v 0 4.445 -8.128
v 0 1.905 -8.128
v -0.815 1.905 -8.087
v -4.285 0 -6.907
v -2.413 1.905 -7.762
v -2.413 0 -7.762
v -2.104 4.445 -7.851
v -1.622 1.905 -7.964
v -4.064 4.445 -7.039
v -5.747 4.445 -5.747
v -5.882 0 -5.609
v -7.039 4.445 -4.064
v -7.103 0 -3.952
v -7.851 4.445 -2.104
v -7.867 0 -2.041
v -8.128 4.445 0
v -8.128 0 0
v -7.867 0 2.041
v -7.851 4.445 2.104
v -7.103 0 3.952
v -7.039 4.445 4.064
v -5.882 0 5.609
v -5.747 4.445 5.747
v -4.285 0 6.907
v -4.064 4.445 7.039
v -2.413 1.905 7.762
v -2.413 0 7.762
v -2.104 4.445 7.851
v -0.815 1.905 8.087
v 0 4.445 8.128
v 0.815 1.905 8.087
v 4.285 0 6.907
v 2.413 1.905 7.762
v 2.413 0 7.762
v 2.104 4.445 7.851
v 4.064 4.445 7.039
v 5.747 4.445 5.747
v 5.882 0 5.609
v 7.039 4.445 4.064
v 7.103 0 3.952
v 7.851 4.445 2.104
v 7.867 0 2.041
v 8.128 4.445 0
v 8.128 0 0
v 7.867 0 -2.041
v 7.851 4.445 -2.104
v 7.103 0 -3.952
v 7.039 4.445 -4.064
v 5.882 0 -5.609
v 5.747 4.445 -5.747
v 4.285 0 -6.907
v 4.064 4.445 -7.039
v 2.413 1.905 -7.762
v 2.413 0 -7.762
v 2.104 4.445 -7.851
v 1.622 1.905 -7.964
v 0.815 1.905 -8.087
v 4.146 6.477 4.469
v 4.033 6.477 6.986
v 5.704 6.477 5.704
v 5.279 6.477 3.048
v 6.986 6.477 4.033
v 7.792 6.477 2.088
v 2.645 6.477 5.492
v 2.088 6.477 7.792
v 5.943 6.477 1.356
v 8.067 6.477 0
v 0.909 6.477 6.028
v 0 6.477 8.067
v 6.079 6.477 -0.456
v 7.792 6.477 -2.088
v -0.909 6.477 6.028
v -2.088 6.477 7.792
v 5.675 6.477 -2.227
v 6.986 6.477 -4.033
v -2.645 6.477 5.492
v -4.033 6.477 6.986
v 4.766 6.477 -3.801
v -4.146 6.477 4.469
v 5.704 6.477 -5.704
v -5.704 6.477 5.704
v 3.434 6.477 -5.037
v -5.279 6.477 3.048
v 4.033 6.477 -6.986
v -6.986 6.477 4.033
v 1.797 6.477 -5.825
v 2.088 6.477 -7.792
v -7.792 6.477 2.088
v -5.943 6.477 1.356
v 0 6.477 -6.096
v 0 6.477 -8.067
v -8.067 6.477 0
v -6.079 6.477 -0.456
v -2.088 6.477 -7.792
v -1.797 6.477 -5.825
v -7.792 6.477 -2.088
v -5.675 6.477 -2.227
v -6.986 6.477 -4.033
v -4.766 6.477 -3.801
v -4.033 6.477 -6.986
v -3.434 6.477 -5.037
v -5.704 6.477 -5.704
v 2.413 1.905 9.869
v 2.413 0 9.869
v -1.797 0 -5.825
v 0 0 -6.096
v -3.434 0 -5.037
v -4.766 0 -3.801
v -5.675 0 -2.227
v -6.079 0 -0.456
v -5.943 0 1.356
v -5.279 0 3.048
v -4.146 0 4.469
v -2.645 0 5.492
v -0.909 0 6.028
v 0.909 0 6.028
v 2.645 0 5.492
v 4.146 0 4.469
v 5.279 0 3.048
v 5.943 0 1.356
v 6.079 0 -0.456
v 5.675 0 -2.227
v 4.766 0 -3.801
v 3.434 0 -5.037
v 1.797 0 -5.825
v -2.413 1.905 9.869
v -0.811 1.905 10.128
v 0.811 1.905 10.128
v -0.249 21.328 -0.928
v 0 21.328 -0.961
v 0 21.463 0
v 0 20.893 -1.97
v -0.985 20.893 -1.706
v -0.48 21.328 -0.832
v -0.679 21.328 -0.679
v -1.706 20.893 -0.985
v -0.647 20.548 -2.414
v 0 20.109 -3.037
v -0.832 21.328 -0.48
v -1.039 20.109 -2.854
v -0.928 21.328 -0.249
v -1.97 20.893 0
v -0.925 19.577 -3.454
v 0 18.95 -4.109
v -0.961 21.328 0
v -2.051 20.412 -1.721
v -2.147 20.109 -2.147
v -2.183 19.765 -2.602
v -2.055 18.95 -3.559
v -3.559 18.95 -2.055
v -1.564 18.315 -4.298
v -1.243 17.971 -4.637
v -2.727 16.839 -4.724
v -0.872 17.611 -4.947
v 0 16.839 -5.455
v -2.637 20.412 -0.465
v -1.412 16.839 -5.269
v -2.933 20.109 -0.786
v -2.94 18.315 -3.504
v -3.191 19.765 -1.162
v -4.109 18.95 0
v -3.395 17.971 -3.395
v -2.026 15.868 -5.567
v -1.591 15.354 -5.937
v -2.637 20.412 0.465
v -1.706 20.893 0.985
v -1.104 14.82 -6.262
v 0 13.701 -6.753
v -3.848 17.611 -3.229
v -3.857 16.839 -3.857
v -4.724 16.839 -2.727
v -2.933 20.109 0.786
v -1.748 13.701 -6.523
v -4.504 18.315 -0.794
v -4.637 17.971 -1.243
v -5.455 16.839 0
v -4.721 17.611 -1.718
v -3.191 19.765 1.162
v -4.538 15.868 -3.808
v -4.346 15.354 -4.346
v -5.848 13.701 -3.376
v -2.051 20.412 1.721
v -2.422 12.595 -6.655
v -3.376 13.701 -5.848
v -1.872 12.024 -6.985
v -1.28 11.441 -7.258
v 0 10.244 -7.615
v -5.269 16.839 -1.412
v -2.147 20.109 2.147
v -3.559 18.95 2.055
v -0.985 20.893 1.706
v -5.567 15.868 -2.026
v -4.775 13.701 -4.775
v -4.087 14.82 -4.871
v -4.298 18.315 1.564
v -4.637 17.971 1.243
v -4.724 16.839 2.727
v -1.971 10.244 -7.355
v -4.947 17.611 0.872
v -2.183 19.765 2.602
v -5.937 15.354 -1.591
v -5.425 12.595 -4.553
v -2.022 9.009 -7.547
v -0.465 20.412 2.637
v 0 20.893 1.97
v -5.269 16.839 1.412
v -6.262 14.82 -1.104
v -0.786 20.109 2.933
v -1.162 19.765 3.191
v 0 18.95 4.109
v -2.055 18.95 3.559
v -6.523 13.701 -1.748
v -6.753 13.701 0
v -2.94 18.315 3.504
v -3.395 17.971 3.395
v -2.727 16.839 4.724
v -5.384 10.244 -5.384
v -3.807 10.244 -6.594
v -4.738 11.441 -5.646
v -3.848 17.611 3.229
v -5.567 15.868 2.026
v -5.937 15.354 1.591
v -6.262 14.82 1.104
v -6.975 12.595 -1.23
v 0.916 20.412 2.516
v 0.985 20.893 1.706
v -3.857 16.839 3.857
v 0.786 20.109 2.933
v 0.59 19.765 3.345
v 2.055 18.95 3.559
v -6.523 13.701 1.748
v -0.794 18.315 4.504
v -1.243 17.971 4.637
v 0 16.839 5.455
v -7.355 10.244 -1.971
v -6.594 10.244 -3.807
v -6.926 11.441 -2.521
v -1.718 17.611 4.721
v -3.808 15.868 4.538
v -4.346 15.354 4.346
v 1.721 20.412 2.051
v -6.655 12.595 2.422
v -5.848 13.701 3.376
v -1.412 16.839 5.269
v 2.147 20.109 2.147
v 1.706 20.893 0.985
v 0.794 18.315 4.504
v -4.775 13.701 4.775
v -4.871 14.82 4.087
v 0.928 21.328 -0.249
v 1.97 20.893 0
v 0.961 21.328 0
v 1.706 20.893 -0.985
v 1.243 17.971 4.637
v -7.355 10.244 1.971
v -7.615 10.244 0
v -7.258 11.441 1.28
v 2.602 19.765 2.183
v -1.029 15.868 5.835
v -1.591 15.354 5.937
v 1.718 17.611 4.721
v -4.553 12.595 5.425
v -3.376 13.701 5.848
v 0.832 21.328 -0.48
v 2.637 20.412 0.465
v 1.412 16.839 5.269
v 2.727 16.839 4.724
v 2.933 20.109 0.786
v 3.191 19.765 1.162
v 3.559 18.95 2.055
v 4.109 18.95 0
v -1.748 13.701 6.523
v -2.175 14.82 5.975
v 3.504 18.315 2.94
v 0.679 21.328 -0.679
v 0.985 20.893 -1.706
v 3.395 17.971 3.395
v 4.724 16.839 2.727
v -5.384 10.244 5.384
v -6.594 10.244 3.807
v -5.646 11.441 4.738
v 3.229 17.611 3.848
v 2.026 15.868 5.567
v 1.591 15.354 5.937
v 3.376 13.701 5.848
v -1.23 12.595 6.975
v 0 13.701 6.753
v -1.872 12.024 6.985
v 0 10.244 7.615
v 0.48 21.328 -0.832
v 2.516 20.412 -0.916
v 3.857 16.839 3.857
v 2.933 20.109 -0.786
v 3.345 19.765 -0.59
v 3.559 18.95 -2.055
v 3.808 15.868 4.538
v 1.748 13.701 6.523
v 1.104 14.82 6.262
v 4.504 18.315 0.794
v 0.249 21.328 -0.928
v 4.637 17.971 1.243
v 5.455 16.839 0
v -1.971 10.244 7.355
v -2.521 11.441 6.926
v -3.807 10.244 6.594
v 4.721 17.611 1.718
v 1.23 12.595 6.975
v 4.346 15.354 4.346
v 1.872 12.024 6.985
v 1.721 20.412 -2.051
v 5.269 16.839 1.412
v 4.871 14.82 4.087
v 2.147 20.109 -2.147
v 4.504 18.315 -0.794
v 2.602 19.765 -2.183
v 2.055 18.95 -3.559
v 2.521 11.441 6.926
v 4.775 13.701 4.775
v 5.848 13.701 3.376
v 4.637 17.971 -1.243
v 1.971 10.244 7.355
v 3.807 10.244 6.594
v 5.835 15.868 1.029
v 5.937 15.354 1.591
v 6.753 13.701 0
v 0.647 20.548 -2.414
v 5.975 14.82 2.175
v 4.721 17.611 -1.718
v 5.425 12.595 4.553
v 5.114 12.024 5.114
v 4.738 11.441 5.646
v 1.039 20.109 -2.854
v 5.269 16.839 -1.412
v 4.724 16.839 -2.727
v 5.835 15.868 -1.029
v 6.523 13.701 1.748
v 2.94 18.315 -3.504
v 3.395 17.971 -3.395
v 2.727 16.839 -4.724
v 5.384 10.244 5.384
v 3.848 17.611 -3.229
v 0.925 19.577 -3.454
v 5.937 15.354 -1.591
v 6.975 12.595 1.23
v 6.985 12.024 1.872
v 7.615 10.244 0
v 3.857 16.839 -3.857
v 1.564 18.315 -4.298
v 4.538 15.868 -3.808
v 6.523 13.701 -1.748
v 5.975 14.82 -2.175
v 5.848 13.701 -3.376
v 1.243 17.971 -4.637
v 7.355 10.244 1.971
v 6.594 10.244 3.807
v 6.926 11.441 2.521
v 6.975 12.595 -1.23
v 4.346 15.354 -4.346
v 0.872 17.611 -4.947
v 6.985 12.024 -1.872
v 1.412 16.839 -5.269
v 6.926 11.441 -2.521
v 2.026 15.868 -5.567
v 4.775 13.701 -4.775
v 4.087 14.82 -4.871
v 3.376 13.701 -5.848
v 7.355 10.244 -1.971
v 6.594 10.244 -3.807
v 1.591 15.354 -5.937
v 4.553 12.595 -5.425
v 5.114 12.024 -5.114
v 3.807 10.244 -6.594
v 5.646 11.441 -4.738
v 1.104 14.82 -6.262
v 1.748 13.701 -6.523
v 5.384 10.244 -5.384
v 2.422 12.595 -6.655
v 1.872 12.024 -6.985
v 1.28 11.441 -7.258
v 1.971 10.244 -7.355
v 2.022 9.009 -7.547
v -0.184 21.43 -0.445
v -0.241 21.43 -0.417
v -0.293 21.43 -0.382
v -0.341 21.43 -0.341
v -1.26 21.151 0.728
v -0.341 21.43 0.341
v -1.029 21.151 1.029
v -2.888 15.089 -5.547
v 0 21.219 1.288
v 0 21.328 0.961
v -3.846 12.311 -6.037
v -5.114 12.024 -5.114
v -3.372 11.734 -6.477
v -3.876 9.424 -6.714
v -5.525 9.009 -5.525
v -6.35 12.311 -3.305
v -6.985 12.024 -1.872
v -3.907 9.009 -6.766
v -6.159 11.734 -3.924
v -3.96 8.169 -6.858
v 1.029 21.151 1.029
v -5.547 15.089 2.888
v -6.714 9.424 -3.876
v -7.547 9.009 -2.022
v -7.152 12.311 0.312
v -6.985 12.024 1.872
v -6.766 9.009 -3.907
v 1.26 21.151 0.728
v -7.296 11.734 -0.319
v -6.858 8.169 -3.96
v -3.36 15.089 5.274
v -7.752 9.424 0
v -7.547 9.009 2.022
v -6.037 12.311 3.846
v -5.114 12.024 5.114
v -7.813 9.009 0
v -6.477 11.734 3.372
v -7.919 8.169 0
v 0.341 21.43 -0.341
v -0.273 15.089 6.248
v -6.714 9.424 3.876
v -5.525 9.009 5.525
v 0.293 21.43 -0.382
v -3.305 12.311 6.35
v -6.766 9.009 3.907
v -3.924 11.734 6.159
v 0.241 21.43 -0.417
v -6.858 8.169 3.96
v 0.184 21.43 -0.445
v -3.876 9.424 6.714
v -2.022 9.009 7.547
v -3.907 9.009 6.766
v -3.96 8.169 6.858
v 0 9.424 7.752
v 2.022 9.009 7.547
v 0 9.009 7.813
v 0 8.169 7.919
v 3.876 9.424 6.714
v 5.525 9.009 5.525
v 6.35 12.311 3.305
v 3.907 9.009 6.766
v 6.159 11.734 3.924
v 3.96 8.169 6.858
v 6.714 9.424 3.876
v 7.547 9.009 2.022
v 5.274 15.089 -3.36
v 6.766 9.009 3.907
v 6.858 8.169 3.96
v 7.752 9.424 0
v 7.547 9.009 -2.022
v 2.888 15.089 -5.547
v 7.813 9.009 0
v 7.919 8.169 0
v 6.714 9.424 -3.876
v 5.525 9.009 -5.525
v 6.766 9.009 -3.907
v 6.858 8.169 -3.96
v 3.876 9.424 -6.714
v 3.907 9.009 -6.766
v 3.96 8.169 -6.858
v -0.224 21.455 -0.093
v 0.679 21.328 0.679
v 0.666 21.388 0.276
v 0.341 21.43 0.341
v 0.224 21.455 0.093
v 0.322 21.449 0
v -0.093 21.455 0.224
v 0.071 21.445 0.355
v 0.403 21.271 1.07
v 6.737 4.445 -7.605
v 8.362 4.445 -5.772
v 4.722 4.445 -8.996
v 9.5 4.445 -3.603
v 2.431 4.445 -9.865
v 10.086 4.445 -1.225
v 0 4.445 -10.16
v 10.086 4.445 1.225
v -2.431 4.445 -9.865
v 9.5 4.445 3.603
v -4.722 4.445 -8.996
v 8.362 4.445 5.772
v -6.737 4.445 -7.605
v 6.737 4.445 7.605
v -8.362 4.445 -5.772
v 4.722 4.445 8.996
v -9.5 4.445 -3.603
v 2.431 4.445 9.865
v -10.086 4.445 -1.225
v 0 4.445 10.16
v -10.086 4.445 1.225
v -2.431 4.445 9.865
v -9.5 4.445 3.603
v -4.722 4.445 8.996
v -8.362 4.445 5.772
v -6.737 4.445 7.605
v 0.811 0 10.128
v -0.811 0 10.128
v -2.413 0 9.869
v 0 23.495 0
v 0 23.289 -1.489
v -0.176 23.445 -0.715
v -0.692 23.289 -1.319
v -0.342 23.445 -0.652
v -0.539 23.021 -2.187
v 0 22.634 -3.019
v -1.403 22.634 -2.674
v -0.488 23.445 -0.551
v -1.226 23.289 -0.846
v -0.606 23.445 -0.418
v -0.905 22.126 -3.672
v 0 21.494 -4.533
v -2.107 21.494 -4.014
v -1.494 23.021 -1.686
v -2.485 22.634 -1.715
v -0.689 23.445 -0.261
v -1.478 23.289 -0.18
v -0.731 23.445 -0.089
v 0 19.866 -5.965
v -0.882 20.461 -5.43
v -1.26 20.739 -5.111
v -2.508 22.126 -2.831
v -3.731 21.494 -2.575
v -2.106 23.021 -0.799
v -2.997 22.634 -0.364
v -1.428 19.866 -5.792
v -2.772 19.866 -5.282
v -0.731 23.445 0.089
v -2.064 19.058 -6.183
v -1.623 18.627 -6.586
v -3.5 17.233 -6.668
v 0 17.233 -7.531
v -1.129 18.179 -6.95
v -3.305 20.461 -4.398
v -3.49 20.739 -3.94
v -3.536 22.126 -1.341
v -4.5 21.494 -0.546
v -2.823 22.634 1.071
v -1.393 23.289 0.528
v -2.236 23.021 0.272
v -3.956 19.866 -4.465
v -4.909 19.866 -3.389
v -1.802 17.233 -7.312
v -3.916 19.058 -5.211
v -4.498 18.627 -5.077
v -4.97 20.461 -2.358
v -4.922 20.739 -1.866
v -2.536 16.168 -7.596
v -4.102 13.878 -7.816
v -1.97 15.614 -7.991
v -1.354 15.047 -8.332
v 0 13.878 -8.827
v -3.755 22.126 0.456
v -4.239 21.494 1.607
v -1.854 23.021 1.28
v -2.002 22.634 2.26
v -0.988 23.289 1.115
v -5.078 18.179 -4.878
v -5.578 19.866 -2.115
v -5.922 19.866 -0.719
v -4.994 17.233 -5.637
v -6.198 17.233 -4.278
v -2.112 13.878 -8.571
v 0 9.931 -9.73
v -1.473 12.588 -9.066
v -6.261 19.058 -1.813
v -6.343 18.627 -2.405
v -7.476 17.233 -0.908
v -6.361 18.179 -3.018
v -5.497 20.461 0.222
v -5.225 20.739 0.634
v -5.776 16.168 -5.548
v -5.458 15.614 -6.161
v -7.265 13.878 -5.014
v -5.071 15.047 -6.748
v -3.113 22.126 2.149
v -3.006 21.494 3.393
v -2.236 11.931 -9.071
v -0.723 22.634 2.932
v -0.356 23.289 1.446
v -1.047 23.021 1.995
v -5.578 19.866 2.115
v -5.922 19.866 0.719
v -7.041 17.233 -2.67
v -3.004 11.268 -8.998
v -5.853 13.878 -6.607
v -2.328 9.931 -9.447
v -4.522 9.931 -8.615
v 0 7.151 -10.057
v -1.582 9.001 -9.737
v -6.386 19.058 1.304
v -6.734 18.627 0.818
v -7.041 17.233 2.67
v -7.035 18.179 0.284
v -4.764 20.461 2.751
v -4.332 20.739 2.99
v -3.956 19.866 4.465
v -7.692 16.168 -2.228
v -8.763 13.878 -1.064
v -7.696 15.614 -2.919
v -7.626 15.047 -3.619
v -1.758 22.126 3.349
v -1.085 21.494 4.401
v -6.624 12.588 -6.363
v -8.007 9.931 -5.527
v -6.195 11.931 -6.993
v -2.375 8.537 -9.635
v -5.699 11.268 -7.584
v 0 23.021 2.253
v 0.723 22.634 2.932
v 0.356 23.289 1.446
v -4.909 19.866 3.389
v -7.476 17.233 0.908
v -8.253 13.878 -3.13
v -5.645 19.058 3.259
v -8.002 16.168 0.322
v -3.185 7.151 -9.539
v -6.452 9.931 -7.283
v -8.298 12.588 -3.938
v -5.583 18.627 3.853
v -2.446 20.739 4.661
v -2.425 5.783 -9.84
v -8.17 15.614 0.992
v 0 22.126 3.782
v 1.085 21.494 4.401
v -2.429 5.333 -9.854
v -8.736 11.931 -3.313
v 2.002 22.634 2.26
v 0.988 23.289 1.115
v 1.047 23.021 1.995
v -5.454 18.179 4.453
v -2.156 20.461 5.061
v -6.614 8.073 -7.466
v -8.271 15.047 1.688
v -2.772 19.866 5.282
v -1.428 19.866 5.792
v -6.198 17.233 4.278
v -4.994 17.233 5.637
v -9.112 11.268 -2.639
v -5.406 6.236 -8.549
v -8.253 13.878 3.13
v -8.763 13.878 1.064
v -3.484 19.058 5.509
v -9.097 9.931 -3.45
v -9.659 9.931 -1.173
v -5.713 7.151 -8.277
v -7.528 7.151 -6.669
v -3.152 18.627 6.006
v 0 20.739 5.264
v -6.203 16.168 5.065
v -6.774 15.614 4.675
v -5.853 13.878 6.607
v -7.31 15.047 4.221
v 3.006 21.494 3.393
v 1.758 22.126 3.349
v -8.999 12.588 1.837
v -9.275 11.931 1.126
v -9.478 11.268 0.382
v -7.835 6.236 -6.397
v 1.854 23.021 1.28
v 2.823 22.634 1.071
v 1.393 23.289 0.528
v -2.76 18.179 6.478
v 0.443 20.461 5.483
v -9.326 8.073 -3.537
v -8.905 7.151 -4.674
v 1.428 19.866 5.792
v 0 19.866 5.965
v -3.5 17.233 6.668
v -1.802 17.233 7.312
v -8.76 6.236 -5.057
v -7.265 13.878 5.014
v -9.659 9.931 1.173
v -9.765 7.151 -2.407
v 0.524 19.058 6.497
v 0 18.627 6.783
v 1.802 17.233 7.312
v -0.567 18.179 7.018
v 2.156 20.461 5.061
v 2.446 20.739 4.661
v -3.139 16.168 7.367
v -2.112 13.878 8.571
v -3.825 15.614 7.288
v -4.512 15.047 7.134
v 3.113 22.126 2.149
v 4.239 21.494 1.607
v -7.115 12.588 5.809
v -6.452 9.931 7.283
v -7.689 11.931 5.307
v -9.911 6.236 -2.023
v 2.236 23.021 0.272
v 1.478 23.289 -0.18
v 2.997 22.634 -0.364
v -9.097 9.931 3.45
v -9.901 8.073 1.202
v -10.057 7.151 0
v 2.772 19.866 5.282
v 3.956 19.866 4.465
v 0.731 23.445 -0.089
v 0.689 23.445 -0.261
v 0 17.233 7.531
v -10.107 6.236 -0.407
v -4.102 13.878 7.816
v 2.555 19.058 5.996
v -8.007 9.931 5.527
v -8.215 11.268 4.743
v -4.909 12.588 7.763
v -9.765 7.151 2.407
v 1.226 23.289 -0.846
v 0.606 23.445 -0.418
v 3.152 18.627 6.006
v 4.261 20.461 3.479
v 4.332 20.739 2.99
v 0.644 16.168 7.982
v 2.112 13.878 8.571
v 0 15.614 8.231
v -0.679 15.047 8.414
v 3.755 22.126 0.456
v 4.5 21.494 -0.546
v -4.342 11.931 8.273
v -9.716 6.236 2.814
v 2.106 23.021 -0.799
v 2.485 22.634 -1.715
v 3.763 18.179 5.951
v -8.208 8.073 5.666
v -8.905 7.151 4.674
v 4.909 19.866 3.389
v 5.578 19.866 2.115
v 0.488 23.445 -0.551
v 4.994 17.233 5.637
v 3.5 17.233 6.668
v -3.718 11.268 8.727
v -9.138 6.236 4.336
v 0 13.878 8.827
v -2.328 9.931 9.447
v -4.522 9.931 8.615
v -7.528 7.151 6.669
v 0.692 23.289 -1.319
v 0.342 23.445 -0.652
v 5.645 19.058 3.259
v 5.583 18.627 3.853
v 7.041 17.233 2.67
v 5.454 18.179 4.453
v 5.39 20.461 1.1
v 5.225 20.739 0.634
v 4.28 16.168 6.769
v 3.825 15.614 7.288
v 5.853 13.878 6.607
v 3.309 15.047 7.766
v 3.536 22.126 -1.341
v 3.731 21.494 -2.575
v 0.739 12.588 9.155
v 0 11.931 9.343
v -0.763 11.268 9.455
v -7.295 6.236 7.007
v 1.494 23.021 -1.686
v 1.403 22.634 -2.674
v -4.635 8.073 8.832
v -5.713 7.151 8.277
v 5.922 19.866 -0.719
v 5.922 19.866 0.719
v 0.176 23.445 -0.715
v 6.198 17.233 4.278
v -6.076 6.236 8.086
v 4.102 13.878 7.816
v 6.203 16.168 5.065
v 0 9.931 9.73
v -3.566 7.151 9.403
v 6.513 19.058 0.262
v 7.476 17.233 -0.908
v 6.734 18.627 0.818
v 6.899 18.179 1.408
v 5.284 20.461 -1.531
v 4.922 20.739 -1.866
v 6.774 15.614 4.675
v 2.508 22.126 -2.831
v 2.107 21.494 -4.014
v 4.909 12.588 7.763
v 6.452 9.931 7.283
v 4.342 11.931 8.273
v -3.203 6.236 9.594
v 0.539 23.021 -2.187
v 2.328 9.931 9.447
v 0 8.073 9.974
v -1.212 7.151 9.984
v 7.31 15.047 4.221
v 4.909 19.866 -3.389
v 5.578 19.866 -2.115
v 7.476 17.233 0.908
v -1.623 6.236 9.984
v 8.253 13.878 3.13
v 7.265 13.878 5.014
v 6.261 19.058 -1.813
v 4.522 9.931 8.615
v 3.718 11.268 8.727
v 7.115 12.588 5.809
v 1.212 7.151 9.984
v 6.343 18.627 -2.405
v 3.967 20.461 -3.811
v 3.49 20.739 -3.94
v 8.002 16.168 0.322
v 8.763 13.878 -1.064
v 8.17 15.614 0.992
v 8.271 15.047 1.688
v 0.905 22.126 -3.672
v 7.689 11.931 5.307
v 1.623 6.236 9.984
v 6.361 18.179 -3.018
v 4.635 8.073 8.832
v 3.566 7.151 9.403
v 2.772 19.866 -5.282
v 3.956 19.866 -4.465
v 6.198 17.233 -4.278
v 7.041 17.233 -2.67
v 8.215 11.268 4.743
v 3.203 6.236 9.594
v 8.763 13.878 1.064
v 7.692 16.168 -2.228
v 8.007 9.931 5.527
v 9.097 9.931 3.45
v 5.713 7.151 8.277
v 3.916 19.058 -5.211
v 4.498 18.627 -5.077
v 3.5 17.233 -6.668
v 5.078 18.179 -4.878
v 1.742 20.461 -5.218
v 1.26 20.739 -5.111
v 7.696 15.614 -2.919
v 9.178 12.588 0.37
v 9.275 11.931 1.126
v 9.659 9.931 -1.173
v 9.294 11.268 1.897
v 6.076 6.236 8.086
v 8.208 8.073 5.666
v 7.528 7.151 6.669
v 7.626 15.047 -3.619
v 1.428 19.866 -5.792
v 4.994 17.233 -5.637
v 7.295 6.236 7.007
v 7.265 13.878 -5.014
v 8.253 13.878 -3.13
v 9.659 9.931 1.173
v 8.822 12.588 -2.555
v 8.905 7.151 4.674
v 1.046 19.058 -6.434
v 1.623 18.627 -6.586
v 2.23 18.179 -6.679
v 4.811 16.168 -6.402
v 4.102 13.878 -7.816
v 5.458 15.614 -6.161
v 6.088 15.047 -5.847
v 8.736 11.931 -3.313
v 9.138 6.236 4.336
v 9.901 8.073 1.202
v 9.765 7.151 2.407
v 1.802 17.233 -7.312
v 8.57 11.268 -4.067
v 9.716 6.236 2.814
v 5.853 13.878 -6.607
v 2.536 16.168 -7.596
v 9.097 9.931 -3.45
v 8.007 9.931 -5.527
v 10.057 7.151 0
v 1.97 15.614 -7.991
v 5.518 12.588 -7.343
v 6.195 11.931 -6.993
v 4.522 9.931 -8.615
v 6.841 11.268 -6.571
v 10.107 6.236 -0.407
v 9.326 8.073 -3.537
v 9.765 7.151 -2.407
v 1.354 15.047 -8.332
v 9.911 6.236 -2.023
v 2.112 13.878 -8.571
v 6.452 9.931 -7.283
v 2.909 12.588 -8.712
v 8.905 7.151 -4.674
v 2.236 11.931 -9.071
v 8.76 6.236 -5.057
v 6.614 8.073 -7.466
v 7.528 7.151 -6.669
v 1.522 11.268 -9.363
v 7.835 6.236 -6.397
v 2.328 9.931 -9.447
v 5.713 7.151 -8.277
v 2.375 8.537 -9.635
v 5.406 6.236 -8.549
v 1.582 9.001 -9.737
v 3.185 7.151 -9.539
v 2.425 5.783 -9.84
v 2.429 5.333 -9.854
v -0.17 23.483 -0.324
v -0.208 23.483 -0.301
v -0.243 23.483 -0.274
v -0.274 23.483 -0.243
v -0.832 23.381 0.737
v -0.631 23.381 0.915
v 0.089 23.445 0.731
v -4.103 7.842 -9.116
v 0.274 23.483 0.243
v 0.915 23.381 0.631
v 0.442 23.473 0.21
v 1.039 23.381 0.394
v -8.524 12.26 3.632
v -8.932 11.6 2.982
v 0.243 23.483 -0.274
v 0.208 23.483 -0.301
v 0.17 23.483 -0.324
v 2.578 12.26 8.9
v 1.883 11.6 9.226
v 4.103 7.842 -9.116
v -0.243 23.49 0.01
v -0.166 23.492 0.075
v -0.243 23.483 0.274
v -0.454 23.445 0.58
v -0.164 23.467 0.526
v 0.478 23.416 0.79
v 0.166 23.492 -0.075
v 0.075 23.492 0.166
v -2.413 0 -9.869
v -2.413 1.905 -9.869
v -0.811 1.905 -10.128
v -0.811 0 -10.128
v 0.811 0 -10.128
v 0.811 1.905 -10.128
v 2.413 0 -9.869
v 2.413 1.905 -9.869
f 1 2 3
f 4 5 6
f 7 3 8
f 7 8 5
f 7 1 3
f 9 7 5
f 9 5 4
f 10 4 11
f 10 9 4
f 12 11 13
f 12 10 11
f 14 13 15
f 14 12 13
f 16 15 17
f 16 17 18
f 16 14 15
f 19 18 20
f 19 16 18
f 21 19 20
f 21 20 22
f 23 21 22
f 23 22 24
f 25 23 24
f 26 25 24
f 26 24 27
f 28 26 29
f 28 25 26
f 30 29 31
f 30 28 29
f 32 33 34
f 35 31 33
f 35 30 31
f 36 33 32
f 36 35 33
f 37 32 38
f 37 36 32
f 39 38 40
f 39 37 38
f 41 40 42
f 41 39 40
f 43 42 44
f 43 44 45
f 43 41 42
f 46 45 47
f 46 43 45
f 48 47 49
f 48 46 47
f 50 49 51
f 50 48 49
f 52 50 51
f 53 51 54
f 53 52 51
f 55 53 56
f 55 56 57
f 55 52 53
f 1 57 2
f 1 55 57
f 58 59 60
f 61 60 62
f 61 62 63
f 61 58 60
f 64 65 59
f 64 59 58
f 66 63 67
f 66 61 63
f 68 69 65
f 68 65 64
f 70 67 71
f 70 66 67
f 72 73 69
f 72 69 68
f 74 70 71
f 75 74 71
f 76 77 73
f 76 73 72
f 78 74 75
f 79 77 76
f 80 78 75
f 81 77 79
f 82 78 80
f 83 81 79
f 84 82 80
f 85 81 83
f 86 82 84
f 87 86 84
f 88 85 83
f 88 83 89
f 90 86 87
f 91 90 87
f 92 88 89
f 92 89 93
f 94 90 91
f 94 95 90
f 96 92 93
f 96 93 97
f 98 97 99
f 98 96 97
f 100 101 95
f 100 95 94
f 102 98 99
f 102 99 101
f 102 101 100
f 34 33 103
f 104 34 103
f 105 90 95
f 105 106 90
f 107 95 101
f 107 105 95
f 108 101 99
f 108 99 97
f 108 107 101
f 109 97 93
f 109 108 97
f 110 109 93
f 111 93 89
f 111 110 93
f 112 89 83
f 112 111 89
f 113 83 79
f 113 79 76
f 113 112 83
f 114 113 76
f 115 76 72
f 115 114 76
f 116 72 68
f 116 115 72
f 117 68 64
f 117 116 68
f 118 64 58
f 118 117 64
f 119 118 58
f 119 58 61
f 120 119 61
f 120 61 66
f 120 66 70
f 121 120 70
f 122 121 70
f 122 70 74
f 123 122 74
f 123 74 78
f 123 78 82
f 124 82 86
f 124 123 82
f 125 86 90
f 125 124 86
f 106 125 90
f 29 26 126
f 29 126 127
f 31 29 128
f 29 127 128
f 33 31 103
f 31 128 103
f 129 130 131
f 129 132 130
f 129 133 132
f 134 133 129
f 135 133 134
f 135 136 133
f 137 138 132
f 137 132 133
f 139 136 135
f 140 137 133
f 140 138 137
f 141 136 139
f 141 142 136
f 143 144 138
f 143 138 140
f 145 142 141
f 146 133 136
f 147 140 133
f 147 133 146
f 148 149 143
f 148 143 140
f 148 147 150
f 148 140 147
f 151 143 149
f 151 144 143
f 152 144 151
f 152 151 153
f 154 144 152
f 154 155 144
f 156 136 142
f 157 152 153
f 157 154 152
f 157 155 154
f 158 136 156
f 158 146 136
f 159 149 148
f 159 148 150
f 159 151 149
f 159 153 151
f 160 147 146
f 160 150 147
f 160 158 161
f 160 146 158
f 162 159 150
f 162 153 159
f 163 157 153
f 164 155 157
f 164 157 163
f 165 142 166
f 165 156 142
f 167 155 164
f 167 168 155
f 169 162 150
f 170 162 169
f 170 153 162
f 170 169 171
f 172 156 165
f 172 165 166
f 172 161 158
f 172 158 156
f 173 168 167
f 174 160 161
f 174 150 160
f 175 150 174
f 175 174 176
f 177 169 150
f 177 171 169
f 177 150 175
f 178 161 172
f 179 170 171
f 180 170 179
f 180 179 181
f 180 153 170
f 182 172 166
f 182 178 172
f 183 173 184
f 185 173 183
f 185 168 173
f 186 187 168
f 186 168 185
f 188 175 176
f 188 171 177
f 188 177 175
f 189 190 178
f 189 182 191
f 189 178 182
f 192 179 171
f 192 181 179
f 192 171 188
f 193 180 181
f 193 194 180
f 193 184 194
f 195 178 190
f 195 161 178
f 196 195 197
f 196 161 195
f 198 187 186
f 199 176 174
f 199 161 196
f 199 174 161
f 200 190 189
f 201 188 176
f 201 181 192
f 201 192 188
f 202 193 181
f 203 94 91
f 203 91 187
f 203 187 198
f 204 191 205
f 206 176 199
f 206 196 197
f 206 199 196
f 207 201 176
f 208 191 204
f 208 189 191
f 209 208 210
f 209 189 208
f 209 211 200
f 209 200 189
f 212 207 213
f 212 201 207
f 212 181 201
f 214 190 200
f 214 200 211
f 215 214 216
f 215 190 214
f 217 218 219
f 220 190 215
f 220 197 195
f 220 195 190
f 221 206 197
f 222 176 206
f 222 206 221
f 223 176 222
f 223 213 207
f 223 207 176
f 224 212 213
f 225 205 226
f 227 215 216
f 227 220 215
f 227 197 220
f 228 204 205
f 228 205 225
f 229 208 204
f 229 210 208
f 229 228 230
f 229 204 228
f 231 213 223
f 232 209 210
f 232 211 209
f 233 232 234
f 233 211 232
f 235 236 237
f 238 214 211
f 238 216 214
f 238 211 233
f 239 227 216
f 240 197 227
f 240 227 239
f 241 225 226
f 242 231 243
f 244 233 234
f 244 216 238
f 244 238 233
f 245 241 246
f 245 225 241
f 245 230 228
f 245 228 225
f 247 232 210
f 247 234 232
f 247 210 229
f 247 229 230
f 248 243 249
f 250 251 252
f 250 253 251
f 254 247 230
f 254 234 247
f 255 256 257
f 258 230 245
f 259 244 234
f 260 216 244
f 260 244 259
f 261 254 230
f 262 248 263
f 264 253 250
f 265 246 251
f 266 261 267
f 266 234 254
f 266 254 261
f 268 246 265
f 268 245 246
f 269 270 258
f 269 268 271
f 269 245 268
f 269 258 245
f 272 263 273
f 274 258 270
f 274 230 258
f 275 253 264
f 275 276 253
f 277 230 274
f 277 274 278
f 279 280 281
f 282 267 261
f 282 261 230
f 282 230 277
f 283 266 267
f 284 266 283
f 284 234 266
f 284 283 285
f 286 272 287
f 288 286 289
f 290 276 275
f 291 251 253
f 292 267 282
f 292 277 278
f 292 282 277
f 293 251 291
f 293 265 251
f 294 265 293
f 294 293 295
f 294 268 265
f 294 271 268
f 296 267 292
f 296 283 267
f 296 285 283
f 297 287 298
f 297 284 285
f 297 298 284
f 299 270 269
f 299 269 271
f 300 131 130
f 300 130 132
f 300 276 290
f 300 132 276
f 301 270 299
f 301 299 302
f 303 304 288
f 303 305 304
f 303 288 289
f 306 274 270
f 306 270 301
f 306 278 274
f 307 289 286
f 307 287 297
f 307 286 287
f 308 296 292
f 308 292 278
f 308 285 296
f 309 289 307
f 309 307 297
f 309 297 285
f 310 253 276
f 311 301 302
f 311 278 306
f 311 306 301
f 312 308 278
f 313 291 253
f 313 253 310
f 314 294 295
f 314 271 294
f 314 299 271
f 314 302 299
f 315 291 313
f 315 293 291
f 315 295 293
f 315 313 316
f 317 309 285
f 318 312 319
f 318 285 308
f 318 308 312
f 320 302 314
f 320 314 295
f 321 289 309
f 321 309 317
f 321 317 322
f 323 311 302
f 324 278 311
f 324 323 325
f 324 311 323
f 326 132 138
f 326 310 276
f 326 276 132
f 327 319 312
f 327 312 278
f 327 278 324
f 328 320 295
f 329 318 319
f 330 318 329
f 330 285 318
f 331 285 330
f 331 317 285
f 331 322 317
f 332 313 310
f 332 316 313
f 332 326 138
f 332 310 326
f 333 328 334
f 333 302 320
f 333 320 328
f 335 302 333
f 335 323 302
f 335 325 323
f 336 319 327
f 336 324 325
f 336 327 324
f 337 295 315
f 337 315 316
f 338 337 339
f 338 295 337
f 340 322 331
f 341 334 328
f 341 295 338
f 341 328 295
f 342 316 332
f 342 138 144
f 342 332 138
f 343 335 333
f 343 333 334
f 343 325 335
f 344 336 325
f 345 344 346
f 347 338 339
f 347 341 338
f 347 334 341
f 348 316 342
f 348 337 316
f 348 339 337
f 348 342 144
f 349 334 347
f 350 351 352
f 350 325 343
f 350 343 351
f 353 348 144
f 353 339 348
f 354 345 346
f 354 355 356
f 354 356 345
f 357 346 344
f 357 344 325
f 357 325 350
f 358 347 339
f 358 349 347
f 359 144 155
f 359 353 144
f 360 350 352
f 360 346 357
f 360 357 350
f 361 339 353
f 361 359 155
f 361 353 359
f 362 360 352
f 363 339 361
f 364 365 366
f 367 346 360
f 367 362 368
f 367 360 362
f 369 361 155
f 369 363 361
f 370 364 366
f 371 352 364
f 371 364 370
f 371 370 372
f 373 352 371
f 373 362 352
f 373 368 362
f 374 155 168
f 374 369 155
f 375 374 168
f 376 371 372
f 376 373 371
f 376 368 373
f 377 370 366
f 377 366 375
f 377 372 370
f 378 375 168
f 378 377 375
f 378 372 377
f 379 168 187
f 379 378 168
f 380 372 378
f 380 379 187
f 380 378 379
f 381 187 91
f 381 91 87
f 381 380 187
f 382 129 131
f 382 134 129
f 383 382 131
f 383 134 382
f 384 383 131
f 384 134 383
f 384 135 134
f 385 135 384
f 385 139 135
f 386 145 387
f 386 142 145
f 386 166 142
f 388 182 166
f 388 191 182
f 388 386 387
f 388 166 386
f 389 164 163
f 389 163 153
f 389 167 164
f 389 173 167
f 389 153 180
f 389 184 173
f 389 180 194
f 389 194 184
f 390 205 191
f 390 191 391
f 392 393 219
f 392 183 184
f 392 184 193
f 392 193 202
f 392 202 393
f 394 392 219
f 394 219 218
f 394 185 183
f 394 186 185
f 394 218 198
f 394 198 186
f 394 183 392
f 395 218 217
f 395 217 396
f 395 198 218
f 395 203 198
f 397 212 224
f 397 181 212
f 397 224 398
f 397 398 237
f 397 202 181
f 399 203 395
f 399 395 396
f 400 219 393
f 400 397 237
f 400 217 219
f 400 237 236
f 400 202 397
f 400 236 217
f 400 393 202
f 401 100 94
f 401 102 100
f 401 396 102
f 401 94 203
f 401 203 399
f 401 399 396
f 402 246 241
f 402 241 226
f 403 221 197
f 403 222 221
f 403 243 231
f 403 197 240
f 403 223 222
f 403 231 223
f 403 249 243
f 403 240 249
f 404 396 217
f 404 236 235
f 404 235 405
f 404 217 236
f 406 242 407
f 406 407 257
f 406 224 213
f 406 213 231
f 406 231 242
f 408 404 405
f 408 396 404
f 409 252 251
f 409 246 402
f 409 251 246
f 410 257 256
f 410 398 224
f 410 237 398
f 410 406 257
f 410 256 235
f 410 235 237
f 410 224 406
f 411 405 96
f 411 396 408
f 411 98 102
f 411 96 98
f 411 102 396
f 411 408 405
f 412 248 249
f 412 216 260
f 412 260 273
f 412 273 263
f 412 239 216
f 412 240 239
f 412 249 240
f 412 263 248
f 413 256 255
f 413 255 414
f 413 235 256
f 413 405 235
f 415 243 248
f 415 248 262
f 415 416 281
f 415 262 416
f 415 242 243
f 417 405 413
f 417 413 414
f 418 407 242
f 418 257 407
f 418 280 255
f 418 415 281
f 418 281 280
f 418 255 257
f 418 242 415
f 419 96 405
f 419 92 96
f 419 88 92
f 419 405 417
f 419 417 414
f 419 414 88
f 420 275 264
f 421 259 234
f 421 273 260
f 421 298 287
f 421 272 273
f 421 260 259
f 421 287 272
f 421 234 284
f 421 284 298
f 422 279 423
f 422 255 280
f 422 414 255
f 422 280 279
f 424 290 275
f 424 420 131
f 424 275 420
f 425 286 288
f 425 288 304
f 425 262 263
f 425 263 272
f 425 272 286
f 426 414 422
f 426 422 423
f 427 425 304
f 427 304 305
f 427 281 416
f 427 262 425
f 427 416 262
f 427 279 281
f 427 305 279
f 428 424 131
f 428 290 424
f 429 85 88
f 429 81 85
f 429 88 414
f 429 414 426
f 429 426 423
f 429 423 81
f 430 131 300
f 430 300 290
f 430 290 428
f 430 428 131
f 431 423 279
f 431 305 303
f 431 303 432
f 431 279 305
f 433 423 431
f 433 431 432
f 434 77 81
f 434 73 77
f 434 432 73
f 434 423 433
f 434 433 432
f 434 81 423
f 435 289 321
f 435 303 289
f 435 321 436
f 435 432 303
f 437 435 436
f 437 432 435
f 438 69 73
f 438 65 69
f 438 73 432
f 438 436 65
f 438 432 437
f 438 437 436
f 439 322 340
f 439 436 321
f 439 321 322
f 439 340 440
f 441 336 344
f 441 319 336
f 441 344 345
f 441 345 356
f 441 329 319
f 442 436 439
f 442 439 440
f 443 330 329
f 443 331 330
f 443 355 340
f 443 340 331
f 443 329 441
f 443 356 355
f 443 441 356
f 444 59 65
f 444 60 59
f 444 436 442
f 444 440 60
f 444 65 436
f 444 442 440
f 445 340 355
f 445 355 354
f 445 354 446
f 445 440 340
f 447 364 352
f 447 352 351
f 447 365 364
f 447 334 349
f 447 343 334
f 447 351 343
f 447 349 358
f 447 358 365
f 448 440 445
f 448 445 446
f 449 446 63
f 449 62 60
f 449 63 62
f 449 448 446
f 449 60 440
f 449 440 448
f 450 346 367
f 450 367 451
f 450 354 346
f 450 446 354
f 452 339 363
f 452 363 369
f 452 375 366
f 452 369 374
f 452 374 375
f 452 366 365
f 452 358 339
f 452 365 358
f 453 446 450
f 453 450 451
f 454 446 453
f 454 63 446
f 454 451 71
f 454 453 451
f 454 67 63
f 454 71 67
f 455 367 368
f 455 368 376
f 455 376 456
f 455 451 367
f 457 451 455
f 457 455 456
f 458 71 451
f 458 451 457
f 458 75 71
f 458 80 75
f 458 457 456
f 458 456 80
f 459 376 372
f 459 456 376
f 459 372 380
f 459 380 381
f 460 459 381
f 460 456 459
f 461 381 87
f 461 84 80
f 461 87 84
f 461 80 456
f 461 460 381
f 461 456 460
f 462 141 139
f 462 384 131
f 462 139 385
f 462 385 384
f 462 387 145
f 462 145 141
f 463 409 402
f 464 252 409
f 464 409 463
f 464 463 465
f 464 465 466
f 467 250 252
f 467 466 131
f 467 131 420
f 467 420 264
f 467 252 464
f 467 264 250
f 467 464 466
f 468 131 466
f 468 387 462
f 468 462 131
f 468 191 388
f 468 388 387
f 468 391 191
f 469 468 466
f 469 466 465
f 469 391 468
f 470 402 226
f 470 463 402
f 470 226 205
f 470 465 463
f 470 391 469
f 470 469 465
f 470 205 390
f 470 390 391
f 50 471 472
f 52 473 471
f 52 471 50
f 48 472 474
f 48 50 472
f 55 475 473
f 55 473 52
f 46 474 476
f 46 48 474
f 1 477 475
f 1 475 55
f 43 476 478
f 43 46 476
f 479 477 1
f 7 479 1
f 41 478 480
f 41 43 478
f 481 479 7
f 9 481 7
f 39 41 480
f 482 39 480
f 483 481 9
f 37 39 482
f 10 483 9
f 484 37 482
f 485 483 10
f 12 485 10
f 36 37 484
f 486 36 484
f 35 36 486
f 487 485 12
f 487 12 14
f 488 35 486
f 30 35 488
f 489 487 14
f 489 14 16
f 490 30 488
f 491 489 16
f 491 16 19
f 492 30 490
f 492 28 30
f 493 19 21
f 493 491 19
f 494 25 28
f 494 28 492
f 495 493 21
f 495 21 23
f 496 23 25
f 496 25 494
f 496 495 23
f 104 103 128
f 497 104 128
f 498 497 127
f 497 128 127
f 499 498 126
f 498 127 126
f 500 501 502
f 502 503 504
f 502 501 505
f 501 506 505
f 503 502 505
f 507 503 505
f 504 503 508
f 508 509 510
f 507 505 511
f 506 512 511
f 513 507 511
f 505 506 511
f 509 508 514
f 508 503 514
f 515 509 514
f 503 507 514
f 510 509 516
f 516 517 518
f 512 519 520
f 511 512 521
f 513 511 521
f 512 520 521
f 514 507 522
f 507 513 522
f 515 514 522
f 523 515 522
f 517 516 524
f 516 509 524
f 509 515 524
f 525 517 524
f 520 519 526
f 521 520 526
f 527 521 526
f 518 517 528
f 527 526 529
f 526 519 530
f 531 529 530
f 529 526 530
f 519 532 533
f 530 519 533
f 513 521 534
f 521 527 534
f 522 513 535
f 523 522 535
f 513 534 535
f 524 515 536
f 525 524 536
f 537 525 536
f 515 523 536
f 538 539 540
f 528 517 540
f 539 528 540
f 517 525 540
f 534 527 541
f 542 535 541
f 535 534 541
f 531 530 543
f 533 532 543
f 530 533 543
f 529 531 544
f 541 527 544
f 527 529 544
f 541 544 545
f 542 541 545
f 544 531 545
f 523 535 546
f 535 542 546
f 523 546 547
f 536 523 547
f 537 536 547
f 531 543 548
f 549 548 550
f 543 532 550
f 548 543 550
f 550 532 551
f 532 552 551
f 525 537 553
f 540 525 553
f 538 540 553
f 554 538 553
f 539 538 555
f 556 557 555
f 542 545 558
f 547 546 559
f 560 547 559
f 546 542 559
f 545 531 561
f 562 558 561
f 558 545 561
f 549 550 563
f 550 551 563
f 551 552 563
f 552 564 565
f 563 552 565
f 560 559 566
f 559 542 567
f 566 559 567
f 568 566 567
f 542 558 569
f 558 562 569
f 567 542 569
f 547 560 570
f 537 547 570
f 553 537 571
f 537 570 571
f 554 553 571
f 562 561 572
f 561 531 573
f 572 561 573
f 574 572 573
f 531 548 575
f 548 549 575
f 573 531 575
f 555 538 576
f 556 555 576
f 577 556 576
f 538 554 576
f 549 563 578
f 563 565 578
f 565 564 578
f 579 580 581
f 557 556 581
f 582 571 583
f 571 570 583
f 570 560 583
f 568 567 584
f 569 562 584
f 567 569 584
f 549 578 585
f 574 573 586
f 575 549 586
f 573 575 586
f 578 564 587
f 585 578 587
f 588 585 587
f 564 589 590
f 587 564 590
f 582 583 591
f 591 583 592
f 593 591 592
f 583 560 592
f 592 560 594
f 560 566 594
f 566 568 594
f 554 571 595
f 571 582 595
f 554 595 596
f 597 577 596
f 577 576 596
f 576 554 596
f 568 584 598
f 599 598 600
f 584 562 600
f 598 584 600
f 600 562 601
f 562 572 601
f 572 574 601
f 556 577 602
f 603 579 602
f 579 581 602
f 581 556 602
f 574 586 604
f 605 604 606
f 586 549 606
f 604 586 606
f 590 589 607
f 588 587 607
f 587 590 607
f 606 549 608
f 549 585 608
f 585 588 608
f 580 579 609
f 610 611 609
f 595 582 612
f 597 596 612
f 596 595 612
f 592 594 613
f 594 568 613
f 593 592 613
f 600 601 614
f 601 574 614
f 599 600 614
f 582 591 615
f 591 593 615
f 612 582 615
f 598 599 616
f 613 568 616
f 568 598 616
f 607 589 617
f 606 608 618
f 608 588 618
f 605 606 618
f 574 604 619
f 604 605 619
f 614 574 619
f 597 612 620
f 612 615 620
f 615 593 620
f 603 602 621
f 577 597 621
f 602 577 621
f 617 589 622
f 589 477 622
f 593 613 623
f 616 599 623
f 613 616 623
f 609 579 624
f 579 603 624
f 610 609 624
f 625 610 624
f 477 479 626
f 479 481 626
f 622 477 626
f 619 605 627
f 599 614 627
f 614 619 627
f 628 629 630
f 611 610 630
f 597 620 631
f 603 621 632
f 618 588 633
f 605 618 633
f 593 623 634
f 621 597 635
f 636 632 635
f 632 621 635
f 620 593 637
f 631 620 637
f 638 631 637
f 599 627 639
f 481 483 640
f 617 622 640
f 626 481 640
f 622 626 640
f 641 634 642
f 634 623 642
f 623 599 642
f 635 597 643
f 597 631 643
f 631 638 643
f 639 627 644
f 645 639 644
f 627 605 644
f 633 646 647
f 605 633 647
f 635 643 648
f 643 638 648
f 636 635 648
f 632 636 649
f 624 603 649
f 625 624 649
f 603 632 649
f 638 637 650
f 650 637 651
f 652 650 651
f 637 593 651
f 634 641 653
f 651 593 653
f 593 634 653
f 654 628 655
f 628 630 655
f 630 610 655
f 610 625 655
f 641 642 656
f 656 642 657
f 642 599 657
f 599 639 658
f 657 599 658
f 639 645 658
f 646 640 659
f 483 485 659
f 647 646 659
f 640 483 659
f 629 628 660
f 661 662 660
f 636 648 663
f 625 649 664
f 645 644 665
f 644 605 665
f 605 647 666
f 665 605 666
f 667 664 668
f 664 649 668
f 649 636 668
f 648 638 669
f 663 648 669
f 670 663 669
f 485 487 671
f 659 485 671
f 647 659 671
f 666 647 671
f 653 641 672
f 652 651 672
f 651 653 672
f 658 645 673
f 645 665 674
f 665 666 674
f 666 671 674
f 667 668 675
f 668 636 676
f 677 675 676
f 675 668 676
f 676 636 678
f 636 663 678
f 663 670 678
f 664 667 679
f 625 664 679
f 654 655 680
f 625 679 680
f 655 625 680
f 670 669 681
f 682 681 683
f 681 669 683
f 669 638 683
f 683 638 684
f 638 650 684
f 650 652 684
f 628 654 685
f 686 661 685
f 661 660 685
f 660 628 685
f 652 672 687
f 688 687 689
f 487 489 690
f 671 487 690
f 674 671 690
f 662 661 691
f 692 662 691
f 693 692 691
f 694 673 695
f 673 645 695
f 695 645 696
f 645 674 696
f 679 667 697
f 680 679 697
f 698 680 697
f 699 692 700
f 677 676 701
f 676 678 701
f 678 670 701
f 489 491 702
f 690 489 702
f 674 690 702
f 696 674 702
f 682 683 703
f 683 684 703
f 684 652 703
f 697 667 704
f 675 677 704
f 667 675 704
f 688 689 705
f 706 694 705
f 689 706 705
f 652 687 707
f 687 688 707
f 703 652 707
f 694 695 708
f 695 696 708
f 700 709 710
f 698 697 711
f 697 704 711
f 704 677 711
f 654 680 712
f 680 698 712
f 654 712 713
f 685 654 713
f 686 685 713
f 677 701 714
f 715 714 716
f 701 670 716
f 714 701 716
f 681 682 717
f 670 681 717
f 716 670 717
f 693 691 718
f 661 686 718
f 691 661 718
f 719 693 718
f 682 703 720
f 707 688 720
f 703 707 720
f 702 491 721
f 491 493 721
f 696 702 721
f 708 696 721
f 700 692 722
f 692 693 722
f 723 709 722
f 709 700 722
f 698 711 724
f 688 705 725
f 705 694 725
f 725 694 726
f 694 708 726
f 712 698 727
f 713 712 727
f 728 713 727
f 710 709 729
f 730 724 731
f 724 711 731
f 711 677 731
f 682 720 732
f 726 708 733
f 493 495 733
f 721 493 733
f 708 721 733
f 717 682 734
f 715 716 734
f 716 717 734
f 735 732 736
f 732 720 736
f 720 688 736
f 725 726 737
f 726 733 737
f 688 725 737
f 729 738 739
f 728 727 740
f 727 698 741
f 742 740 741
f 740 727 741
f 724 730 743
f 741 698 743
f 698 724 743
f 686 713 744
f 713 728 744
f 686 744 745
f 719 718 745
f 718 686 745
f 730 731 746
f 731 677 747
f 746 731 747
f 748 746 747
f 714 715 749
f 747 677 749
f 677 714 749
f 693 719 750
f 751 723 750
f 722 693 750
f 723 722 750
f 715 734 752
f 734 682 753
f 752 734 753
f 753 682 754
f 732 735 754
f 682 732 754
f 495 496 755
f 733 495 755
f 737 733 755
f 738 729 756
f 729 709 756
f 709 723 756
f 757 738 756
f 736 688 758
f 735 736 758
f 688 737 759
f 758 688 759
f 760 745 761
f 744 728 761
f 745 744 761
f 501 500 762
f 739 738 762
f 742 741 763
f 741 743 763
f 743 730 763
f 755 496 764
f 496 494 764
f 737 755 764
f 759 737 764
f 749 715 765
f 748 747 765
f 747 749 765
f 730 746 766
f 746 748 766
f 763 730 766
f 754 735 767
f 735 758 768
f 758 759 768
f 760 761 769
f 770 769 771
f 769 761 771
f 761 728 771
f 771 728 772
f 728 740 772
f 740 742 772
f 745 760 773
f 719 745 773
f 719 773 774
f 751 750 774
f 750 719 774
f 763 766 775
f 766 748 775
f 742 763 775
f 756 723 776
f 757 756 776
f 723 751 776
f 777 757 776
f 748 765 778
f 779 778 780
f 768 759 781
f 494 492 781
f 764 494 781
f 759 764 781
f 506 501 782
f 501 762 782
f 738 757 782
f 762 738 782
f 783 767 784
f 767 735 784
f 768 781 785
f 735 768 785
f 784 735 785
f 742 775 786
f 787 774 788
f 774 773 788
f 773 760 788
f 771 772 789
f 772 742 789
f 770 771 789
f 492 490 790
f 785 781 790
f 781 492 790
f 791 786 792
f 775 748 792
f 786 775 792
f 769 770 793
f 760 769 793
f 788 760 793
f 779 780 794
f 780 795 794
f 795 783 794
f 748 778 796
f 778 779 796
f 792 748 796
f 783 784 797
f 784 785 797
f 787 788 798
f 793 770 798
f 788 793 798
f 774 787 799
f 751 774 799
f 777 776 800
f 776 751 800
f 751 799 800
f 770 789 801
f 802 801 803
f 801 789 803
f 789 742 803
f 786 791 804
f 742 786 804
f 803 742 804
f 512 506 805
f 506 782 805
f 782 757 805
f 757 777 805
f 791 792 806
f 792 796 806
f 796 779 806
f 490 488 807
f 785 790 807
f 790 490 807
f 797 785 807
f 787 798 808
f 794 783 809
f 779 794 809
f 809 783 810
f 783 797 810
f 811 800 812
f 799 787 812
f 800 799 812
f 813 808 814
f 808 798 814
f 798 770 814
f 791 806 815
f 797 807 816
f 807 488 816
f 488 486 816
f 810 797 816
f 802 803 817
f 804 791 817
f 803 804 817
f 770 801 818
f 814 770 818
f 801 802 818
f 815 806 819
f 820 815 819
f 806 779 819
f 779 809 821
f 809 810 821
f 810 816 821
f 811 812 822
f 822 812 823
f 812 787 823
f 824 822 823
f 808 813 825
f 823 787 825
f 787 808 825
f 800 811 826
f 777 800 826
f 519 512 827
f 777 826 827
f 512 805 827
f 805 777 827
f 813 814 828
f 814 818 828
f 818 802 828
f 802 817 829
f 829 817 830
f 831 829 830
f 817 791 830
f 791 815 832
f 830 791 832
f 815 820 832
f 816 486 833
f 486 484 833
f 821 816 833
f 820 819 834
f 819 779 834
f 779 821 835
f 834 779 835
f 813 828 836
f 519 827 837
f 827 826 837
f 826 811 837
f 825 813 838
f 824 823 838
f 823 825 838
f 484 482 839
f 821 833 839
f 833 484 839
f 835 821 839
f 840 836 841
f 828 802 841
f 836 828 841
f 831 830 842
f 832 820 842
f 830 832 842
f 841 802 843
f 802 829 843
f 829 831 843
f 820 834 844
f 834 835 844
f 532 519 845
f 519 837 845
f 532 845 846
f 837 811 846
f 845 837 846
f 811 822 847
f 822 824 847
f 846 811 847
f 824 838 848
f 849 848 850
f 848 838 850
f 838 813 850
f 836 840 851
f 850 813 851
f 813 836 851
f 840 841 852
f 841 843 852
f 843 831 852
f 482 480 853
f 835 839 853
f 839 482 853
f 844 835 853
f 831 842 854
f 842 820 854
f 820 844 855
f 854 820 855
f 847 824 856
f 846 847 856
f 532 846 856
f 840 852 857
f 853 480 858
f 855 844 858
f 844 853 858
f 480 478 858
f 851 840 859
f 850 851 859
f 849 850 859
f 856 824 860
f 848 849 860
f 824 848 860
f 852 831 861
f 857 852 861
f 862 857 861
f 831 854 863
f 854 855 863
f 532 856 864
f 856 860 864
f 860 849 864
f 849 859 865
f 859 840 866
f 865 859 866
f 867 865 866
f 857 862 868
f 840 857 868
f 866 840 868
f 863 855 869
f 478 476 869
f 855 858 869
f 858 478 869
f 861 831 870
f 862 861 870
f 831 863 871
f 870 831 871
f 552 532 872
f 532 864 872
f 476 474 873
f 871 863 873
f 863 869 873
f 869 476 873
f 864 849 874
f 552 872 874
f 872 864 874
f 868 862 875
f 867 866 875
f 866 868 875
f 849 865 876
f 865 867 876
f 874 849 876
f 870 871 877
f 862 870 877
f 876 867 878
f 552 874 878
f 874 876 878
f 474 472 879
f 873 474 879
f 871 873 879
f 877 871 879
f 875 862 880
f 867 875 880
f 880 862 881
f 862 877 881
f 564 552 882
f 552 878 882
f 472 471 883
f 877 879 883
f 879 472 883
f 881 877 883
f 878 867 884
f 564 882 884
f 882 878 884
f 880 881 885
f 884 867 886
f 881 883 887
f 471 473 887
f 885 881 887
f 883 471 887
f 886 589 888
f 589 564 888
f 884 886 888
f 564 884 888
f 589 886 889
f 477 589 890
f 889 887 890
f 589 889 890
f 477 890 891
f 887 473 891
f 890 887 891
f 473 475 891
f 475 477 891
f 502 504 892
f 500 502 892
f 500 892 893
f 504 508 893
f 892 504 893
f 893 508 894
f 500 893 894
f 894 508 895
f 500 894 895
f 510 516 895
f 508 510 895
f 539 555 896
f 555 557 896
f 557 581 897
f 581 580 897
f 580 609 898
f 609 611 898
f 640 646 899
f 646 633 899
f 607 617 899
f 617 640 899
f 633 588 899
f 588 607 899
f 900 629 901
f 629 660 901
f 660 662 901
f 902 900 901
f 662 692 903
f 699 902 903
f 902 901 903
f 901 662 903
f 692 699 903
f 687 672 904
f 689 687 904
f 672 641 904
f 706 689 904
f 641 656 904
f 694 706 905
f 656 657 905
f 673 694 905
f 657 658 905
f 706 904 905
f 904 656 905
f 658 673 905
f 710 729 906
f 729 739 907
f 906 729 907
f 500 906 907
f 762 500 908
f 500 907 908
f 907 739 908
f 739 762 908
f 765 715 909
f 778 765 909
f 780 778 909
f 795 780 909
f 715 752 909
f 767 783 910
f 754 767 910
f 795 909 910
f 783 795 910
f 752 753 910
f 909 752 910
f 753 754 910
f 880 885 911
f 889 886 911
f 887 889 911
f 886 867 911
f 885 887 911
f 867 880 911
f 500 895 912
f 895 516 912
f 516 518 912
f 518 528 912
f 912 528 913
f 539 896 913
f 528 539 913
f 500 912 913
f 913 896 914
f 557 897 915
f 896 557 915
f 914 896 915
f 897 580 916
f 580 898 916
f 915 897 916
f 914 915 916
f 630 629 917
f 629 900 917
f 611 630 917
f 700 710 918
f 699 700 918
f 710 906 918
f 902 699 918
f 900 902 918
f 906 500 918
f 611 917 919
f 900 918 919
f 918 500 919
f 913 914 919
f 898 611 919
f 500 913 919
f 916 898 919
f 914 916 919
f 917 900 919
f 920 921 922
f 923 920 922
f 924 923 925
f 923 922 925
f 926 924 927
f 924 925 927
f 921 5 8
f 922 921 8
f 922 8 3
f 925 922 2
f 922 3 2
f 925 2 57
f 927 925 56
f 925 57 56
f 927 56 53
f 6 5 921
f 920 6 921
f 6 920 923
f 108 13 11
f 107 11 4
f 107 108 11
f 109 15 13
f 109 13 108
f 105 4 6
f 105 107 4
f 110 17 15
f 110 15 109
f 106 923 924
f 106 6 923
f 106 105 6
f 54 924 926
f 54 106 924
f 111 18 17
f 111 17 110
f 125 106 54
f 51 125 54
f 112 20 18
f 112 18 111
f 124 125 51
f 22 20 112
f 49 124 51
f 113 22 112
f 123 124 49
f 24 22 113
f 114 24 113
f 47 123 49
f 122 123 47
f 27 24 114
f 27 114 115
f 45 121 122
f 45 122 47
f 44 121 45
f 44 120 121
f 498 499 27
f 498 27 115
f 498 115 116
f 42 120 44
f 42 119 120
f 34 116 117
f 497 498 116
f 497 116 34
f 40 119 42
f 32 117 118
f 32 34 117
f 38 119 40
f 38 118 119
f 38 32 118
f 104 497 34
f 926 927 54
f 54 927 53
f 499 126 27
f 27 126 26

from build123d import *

# Parameters (mm, degrees)
BOSS_EXTRUDE1_START = 2.54
BOSS_EXTRUDE1_DEPTH = 1.905


with BuildPart() as part:
    # Sketch1 → Revolve1 (revolve)
    with BuildSketch(Plane(origin=(0, 0, 0), x_dir=(0, 0, -1), z_dir=(1, 0, 0)), mode=Mode.PRIVATE) as revolve1_sk:
        with BuildLine():
            Line((-8.128, 0), (-8.128, 4.445))
            Line((-8.128, 4.445), (-10.16, 4.445))
            add(Edge.make_bspline(
                [(0, 23.495), (-10.16, 23.495), (-10.16, 4.445)],
                knots=[3.141592654, 3.141592654, 3.141592654, 4.71238898, 4.71238898, 4.71238898], degree=2, weights=[1, 0.707106781, 1]))
            Line((0, 23.495), (0, 21.463))
            add(Edge.make_bspline(
                [(0, 21.463), (-0.398270959, 21.463), (-1.153389942, 21.335826731), (-2.429445225, 20.684705062), (-3.759980482, 19.474733116), (-5.045566653, 17.699172098), (-6.18547282, 15.416687429), (-7.108495403, 12.712906185), (-7.763293706, 9.707759052), (-8.001641772, 7.545168518), (-8.066508555, 6.477)],
                knots=[3.141592654, 3.141592654, 3.141592654, 3.141592654, 3.323770314, 3.505947975, 3.688125635, 3.870303296, 4.052480956, 4.234658617, 4.416836277, 4.599013938, 4.599013938, 4.599013938, 4.599013938], degree=3))
            Line((-8.066508555, 6.477), (-6.096, 6.477))
            Line((-6.096, 6.477), (-6.096, 0))
            Line((-6.096, 0), (-8.128, 0))
        make_face()
    revolve(revolve1_sk.sketch.rotate(Axis((0, 0, 0), (0, 1, 0)), 180), axis=Axis((0, 0, 0), (0, 1, 0)))

    # Sketch2 → Boss-Extrude1 (add)
    with BuildSketch(Plane.XZ.offset(-4.445).offset(BOSS_EXTRUDE1_START)):
        with BuildLine():
            Line((-2.413, 9.869297391), (-2.413, 7.761560088))
            ThreePointArc((-2.413, 7.761560088), (0, 8.128), (2.413, 7.761560088))
            Line((2.413, 7.761560088), (2.413, 9.869297391))
            ThreePointArc((2.413, 9.869297391), (0, 10.16), (-2.413, 9.869297391))
        make_face()
        with BuildLine():
            Line((2.413, -9.869297391), (2.413, -7.761560088))
            ThreePointArc((2.413, -7.761560088), (0, -8.128), (-2.413, -7.761560088))
            Line((-2.413, -7.761560088), (-2.413, -9.869297391))
            ThreePointArc((-2.413, -9.869297391), (0, -10.16), (2.413, -9.869297391))
        make_face()
    extrude(amount=BOSS_EXTRUDE1_DEPTH)


solid = part.part
